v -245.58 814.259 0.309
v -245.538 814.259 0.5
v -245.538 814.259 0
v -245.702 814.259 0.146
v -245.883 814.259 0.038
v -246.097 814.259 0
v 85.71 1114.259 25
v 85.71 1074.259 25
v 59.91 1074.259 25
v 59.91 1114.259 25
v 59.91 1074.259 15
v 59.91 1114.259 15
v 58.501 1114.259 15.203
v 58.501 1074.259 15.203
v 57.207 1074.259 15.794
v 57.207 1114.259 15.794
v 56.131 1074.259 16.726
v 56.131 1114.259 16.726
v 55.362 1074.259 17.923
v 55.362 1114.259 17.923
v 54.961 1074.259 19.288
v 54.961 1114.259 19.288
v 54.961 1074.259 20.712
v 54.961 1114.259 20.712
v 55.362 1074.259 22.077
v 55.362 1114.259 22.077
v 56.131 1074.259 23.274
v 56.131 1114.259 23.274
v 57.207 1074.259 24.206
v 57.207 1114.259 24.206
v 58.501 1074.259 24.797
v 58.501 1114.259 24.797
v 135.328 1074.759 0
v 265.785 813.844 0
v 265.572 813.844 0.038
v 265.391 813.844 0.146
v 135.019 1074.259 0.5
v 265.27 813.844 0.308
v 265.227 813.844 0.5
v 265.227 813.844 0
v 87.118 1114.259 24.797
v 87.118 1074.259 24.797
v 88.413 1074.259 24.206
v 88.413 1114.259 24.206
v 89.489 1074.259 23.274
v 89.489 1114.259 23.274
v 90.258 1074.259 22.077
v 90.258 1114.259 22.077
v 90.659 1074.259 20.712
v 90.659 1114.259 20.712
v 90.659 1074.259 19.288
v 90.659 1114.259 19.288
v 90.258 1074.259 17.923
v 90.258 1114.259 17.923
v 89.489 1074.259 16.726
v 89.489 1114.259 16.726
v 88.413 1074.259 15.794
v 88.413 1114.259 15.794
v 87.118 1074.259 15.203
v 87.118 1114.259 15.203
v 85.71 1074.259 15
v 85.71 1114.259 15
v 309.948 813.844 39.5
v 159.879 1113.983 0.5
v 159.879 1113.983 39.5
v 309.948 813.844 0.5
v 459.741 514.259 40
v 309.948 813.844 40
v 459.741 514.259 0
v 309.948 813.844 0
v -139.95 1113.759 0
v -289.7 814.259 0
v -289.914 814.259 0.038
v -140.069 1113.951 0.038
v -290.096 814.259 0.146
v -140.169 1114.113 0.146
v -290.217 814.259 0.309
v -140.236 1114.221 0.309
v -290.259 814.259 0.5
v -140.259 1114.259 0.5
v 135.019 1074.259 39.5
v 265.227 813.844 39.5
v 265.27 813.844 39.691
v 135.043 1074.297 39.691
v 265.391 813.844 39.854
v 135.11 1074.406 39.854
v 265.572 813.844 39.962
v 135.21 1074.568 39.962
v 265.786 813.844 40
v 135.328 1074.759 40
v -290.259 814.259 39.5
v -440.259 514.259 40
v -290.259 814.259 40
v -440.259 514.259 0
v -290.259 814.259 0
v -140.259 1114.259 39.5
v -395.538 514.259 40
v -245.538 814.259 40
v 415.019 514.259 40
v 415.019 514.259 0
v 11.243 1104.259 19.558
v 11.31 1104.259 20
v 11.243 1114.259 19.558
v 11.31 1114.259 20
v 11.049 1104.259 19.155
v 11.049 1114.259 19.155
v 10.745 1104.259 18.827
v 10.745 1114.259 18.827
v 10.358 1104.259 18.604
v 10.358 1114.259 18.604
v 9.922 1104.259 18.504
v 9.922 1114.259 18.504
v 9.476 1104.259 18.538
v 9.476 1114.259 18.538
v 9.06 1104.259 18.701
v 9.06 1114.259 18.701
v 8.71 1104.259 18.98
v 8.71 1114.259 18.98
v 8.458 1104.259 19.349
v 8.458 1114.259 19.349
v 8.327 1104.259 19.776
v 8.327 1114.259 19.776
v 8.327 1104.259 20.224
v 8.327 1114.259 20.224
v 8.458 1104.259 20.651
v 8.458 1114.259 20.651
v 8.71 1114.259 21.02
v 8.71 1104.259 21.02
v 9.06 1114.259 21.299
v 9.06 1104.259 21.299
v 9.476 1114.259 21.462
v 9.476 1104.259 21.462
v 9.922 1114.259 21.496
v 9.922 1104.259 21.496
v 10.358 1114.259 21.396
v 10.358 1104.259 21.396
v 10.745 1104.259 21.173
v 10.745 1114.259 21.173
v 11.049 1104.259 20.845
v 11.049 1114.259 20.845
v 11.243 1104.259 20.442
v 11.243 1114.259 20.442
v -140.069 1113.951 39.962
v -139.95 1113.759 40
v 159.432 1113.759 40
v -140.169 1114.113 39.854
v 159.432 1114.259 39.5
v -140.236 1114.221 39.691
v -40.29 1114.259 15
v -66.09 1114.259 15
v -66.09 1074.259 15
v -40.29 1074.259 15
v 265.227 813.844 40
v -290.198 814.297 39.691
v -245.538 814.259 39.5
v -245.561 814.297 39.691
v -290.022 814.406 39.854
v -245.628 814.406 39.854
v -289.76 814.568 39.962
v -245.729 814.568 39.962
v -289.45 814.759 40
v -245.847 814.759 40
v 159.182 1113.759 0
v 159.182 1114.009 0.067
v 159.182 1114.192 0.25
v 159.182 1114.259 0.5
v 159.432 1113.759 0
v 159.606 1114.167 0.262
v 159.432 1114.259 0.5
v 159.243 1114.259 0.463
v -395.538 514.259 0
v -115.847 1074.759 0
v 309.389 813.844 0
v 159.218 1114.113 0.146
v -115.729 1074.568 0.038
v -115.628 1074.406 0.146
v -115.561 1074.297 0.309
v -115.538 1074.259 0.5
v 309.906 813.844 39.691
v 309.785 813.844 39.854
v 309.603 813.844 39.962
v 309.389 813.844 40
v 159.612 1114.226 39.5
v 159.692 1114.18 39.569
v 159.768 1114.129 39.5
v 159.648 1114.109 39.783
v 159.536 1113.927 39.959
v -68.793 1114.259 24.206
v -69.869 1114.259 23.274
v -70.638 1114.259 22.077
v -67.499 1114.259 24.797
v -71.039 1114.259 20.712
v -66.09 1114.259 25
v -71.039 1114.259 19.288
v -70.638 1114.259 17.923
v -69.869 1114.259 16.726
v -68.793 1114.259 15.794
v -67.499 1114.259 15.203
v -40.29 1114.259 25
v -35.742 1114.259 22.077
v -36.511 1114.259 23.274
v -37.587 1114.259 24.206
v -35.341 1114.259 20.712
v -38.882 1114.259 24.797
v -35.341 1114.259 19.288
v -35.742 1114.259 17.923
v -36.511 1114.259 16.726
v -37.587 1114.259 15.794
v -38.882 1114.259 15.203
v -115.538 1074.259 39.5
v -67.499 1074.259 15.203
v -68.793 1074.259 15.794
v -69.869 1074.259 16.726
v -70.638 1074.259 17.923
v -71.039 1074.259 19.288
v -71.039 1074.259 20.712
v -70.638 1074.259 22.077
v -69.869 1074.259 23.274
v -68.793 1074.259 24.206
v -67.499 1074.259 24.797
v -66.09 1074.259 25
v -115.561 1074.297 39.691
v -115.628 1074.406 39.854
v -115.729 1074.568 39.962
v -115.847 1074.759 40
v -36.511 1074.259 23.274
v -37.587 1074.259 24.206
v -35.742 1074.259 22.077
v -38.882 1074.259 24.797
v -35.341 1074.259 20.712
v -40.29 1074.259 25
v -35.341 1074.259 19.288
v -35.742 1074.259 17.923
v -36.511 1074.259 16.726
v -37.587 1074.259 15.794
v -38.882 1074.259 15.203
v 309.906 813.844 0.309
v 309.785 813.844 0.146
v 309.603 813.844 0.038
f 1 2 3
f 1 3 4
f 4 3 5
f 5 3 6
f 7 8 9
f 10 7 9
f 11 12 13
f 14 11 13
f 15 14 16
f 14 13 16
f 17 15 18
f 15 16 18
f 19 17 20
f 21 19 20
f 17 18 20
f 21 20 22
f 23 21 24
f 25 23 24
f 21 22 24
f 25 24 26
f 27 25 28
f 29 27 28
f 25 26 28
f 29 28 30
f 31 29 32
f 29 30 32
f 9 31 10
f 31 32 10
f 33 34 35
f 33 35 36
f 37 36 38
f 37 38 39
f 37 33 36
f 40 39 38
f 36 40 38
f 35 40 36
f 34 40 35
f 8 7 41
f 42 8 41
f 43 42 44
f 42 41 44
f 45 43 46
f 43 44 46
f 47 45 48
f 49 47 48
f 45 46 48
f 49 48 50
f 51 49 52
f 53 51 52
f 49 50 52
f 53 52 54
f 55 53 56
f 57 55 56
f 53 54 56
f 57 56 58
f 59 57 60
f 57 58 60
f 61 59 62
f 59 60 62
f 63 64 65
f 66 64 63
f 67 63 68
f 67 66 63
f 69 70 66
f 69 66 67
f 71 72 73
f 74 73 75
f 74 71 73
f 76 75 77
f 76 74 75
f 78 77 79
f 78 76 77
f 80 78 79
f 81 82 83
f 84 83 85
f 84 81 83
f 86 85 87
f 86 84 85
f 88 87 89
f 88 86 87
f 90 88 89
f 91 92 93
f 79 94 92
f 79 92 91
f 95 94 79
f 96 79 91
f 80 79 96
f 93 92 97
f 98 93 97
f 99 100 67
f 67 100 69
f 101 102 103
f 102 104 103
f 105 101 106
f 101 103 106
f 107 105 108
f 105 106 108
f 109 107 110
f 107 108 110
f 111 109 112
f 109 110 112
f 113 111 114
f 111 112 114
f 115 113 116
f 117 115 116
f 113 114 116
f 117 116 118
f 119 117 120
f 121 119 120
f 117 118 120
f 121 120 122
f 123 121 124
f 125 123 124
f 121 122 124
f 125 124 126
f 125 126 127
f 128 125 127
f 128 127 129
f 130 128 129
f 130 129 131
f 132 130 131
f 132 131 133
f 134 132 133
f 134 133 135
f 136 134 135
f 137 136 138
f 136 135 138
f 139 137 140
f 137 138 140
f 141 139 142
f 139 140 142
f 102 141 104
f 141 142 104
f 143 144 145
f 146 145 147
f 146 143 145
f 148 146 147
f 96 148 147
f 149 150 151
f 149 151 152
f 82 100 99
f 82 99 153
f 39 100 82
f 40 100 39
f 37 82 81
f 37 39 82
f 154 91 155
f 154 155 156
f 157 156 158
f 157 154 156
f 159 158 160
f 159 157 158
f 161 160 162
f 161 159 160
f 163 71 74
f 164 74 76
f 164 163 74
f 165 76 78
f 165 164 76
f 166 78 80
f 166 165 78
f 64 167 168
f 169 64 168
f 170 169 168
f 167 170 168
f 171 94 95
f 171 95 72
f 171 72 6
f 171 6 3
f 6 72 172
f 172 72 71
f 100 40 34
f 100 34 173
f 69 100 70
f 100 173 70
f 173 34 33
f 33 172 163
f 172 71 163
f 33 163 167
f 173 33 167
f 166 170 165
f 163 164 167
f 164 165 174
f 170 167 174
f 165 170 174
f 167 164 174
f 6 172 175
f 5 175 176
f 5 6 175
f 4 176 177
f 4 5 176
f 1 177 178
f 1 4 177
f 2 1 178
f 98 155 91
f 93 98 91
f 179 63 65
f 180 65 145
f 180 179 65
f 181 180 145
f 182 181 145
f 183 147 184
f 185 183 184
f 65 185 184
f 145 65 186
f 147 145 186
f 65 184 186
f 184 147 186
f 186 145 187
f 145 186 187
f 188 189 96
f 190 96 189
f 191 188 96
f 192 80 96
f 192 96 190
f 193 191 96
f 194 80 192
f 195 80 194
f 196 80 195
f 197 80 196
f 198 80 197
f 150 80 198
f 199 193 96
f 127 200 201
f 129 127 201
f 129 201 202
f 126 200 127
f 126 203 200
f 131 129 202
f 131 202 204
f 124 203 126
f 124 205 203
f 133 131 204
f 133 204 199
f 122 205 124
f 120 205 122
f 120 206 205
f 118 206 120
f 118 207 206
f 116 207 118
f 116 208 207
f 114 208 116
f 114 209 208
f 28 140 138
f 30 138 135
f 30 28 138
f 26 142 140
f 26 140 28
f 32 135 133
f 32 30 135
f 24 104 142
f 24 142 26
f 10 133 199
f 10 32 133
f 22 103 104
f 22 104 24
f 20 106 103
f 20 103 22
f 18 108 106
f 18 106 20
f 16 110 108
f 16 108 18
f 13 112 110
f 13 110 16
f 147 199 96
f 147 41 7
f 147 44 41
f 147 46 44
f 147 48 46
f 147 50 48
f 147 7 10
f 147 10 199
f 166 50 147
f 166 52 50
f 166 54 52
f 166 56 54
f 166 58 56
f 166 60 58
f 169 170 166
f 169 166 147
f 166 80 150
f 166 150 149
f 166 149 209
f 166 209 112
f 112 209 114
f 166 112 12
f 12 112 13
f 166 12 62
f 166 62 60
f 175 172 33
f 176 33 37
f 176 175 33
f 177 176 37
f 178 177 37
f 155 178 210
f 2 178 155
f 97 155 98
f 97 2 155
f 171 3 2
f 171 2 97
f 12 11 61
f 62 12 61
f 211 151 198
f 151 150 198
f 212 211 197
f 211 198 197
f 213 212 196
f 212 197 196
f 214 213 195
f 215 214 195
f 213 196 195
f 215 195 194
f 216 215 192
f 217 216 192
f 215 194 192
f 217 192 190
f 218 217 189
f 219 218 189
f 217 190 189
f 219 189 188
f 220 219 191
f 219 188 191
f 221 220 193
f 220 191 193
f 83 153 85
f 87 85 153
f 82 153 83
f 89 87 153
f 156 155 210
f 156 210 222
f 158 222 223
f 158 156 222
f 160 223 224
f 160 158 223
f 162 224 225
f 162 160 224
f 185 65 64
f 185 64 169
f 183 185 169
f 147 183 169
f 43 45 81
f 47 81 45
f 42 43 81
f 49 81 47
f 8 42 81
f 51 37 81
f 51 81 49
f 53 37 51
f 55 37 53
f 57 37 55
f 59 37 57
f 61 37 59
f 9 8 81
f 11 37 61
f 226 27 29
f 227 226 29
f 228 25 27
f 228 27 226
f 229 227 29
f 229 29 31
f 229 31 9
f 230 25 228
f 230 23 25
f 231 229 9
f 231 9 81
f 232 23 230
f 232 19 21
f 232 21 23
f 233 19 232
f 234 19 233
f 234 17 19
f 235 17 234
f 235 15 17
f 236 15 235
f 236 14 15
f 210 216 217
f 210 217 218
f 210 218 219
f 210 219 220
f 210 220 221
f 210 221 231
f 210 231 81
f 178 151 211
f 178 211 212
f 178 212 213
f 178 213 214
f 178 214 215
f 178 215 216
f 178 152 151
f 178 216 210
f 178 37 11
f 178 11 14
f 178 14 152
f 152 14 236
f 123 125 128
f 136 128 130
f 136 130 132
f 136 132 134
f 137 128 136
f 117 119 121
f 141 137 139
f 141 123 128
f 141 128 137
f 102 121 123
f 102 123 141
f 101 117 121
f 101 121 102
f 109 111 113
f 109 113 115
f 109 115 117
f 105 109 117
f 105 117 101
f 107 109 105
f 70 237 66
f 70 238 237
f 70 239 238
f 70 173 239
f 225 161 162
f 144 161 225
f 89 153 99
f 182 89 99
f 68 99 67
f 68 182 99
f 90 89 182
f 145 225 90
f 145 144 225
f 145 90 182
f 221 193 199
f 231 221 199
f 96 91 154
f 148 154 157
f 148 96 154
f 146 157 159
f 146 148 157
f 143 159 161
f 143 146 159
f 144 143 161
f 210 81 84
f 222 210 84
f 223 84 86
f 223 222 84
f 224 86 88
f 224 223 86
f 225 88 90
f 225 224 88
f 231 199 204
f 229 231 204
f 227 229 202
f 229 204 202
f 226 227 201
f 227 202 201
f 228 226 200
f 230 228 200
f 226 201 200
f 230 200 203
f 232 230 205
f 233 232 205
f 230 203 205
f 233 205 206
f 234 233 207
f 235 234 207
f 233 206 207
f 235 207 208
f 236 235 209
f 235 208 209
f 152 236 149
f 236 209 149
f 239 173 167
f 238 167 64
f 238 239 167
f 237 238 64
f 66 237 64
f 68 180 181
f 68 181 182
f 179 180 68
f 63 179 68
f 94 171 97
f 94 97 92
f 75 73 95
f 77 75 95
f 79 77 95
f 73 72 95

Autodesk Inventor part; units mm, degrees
ref_plane "YZ Plane" through (0, 0, 0) normal (1, 0, 0) x (0, 1, 0)
ref_plane "XZ Plane" through (0, 0, 0) normal (0, 1, 0) x (-1, 0, 0)
ref_plane "XY Plane" through (0, 0, 0) normal (0, 0, 1) x (1, 0, 0)
sketch "Sketch1" plane through (0, 0, 0) normal (0, 0, 1) x (1, 0, 0)
  line L0 (9.7407, 1114.2593) -> (159.7407, 1114.2593)
  line L1 (9.7407, 1114.2593) -> (-140.2593, 1114.2593)
  line L2 (-290.2593, 814.2593) -> (-140.2593, 1114.2593)
  line L3 (159.7407, 1114.2593) -> (459.7407, 514.2593)
  line L4 (135.0194, 1074.2593) -> (9.7407, 1074.2593)
  line L5 (9.7407, 1074.2593) -> (-115.5379, 1074.2593)
  line L6 (-115.5379, 1074.2593) -> (-245.5379, 814.2593)
  line L7 (9.7407, 1114.2593) -> (159.7407, 1114.2593)
  line L8 (9.7407, 1114.2593) -> (-140.2593, 1114.2593)
  line L9 (-440.2593, 514.2593) -> (-140.2593, 1114.2593)
  line L10 (159.7407, 1114.2593) -> (309.9483, 813.8441)
  line L11 (135.0194, 1074.2593) -> (9.7407, 1074.2593)
  line L12 (9.7407, 1074.2593) -> (-115.5379, 1074.2593)
  line L13 (-115.5379, 1074.2593) -> (-245.5379, 814.2593)
  line L14 (-245.5379, 814.2593) -> (-290.2593, 814.2593)
  line L15 (265.227, 813.8441) -> (309.9483, 813.8441)
  line L16 (265.227, 813.8441) -> (135.0194, 1074.2593)
  line L17 (415.0194, 514.2593) -> (135.0194, 1074.2593)
  line L18 (-395.5379, 514.2593) -> (-440.2593, 514.2593)
  line L19 (-245.5379, 814.2593) -> (-395.5379, 514.2593)
  line L20 (-440.2593, 514.2593) -> (-395.5379, 514.2593)
  line L21 (415.0194, 514.2593) -> (459.7407, 514.2593)
  point P0 (0, 0)
  dimension "d13" = 300
extrude "Extrusion1" add sketch "Sketch1" along normal blind 40 contours L0 L3 L15 L16 L4 L5 L6 L14 L2 L1
fillet "Fillet1" radius 0.5 10 edges at (72.3801, 1074.2593, 40) (72.3801, 1074.2593, 0) (200.1232, 944.0517, 40) (234.8445, 964.0517, 40) (-65.2593, 1114.2593, 40) (-215.2593, 964.2593, 40) (-180.5379, 944.2593, 40) (-267.8986, 814.2593, 40) (-180.5379, 944.2593, 0) (234.8445, 964.0517, 0)
fillet "Fillet2" radius 0.5 1 edges at (200.1232, 944.0517, 0)
fillet "Fillet3" radius 0.5 3 edges at (159.7407, 1114.2593, 20) (84.4612, 1114.2593, 0) (-215.2593, 964.2593, 0)
sketch "Sketch2" plane through (-140.2593, 1114.2593, 0.5) normal (0, 1, 0) x (1, 0, 0)
  line L0 (300.1382, -39) -> (300.1382, 0) projected
  line L1 (300.1382, -19.5) -> (0, -19.5)
  line L2 (0, 0) -> (0, -39) projected
  circle A0 centre (150.0691, -19.5) radius 1.5
  point P0 (140.2593, 0.5)
  dimension "d14" = 3
extrude "Extrusion2" cut sketch "Sketch2" against normal blind 10
extrude "Extrusion3" add sketch "Sketch1" along normal blind 40 contours L3 L21 L17 L15 | L14 L19 L18 L9
sketch "Sketch3" plane through (-140.2593, 1114.2593, 0.5) normal (0, 1, 0) x (1, 0, 0)
  point P0 (140.2593, 0.5)
sketch "Sketch4" plane through (-140.2593, 1114.2593, 0.5) normal (0, 1, 0) x (1, 0, 0)
  circle A0 centre (150.0691, -19.5) radius 1.5 projected
  line L0 (0, 0) -> (299.691, 0) projected
  line L1 (0, 0) -> (0, -39) projected
  line L2 (299.691, -39) -> (0, -39) projected
  line L3 (299.691, 0) -> (299.691, -39) projected
  line L4 (200.1691, -14.5) -> (225.9691, -14.5) projected
  line L5 (225.9691, -24.5) -> (200.1691, -24.5) projected
  arc A1 (225.9691, -24.5) -> (225.9691, -14.5) centre (225.9691, -19.5) ccw projected
  arc A2 (200.1691, -14.5) -> (200.1691, -24.5) centre (200.1691, -19.5) ccw projected
  arc A3 (74.1691, -14.5) -> (74.1691, -24.5) centre (74.1691, -19.5) ccw projected
  line L6 (74.1691, -14.5) -> (99.9691, -14.5) projected
  line L7 (74.1691, -24.5) -> (99.9691, -24.5) projected
  arc A4 (99.9691, -24.5) -> (99.9691, -14.5) centre (99.9691, -19.5) ccw projected
  point P0 (140.2593, 0.5)
extrude "Extrusion4" cut sketch "Sketch4" against normal blind 50 contours L4 A1 L5 A2 | L6 A4 L7 A3
properties part number "CAVALETE_INFERIOR" material "SAE 1010/1020"
